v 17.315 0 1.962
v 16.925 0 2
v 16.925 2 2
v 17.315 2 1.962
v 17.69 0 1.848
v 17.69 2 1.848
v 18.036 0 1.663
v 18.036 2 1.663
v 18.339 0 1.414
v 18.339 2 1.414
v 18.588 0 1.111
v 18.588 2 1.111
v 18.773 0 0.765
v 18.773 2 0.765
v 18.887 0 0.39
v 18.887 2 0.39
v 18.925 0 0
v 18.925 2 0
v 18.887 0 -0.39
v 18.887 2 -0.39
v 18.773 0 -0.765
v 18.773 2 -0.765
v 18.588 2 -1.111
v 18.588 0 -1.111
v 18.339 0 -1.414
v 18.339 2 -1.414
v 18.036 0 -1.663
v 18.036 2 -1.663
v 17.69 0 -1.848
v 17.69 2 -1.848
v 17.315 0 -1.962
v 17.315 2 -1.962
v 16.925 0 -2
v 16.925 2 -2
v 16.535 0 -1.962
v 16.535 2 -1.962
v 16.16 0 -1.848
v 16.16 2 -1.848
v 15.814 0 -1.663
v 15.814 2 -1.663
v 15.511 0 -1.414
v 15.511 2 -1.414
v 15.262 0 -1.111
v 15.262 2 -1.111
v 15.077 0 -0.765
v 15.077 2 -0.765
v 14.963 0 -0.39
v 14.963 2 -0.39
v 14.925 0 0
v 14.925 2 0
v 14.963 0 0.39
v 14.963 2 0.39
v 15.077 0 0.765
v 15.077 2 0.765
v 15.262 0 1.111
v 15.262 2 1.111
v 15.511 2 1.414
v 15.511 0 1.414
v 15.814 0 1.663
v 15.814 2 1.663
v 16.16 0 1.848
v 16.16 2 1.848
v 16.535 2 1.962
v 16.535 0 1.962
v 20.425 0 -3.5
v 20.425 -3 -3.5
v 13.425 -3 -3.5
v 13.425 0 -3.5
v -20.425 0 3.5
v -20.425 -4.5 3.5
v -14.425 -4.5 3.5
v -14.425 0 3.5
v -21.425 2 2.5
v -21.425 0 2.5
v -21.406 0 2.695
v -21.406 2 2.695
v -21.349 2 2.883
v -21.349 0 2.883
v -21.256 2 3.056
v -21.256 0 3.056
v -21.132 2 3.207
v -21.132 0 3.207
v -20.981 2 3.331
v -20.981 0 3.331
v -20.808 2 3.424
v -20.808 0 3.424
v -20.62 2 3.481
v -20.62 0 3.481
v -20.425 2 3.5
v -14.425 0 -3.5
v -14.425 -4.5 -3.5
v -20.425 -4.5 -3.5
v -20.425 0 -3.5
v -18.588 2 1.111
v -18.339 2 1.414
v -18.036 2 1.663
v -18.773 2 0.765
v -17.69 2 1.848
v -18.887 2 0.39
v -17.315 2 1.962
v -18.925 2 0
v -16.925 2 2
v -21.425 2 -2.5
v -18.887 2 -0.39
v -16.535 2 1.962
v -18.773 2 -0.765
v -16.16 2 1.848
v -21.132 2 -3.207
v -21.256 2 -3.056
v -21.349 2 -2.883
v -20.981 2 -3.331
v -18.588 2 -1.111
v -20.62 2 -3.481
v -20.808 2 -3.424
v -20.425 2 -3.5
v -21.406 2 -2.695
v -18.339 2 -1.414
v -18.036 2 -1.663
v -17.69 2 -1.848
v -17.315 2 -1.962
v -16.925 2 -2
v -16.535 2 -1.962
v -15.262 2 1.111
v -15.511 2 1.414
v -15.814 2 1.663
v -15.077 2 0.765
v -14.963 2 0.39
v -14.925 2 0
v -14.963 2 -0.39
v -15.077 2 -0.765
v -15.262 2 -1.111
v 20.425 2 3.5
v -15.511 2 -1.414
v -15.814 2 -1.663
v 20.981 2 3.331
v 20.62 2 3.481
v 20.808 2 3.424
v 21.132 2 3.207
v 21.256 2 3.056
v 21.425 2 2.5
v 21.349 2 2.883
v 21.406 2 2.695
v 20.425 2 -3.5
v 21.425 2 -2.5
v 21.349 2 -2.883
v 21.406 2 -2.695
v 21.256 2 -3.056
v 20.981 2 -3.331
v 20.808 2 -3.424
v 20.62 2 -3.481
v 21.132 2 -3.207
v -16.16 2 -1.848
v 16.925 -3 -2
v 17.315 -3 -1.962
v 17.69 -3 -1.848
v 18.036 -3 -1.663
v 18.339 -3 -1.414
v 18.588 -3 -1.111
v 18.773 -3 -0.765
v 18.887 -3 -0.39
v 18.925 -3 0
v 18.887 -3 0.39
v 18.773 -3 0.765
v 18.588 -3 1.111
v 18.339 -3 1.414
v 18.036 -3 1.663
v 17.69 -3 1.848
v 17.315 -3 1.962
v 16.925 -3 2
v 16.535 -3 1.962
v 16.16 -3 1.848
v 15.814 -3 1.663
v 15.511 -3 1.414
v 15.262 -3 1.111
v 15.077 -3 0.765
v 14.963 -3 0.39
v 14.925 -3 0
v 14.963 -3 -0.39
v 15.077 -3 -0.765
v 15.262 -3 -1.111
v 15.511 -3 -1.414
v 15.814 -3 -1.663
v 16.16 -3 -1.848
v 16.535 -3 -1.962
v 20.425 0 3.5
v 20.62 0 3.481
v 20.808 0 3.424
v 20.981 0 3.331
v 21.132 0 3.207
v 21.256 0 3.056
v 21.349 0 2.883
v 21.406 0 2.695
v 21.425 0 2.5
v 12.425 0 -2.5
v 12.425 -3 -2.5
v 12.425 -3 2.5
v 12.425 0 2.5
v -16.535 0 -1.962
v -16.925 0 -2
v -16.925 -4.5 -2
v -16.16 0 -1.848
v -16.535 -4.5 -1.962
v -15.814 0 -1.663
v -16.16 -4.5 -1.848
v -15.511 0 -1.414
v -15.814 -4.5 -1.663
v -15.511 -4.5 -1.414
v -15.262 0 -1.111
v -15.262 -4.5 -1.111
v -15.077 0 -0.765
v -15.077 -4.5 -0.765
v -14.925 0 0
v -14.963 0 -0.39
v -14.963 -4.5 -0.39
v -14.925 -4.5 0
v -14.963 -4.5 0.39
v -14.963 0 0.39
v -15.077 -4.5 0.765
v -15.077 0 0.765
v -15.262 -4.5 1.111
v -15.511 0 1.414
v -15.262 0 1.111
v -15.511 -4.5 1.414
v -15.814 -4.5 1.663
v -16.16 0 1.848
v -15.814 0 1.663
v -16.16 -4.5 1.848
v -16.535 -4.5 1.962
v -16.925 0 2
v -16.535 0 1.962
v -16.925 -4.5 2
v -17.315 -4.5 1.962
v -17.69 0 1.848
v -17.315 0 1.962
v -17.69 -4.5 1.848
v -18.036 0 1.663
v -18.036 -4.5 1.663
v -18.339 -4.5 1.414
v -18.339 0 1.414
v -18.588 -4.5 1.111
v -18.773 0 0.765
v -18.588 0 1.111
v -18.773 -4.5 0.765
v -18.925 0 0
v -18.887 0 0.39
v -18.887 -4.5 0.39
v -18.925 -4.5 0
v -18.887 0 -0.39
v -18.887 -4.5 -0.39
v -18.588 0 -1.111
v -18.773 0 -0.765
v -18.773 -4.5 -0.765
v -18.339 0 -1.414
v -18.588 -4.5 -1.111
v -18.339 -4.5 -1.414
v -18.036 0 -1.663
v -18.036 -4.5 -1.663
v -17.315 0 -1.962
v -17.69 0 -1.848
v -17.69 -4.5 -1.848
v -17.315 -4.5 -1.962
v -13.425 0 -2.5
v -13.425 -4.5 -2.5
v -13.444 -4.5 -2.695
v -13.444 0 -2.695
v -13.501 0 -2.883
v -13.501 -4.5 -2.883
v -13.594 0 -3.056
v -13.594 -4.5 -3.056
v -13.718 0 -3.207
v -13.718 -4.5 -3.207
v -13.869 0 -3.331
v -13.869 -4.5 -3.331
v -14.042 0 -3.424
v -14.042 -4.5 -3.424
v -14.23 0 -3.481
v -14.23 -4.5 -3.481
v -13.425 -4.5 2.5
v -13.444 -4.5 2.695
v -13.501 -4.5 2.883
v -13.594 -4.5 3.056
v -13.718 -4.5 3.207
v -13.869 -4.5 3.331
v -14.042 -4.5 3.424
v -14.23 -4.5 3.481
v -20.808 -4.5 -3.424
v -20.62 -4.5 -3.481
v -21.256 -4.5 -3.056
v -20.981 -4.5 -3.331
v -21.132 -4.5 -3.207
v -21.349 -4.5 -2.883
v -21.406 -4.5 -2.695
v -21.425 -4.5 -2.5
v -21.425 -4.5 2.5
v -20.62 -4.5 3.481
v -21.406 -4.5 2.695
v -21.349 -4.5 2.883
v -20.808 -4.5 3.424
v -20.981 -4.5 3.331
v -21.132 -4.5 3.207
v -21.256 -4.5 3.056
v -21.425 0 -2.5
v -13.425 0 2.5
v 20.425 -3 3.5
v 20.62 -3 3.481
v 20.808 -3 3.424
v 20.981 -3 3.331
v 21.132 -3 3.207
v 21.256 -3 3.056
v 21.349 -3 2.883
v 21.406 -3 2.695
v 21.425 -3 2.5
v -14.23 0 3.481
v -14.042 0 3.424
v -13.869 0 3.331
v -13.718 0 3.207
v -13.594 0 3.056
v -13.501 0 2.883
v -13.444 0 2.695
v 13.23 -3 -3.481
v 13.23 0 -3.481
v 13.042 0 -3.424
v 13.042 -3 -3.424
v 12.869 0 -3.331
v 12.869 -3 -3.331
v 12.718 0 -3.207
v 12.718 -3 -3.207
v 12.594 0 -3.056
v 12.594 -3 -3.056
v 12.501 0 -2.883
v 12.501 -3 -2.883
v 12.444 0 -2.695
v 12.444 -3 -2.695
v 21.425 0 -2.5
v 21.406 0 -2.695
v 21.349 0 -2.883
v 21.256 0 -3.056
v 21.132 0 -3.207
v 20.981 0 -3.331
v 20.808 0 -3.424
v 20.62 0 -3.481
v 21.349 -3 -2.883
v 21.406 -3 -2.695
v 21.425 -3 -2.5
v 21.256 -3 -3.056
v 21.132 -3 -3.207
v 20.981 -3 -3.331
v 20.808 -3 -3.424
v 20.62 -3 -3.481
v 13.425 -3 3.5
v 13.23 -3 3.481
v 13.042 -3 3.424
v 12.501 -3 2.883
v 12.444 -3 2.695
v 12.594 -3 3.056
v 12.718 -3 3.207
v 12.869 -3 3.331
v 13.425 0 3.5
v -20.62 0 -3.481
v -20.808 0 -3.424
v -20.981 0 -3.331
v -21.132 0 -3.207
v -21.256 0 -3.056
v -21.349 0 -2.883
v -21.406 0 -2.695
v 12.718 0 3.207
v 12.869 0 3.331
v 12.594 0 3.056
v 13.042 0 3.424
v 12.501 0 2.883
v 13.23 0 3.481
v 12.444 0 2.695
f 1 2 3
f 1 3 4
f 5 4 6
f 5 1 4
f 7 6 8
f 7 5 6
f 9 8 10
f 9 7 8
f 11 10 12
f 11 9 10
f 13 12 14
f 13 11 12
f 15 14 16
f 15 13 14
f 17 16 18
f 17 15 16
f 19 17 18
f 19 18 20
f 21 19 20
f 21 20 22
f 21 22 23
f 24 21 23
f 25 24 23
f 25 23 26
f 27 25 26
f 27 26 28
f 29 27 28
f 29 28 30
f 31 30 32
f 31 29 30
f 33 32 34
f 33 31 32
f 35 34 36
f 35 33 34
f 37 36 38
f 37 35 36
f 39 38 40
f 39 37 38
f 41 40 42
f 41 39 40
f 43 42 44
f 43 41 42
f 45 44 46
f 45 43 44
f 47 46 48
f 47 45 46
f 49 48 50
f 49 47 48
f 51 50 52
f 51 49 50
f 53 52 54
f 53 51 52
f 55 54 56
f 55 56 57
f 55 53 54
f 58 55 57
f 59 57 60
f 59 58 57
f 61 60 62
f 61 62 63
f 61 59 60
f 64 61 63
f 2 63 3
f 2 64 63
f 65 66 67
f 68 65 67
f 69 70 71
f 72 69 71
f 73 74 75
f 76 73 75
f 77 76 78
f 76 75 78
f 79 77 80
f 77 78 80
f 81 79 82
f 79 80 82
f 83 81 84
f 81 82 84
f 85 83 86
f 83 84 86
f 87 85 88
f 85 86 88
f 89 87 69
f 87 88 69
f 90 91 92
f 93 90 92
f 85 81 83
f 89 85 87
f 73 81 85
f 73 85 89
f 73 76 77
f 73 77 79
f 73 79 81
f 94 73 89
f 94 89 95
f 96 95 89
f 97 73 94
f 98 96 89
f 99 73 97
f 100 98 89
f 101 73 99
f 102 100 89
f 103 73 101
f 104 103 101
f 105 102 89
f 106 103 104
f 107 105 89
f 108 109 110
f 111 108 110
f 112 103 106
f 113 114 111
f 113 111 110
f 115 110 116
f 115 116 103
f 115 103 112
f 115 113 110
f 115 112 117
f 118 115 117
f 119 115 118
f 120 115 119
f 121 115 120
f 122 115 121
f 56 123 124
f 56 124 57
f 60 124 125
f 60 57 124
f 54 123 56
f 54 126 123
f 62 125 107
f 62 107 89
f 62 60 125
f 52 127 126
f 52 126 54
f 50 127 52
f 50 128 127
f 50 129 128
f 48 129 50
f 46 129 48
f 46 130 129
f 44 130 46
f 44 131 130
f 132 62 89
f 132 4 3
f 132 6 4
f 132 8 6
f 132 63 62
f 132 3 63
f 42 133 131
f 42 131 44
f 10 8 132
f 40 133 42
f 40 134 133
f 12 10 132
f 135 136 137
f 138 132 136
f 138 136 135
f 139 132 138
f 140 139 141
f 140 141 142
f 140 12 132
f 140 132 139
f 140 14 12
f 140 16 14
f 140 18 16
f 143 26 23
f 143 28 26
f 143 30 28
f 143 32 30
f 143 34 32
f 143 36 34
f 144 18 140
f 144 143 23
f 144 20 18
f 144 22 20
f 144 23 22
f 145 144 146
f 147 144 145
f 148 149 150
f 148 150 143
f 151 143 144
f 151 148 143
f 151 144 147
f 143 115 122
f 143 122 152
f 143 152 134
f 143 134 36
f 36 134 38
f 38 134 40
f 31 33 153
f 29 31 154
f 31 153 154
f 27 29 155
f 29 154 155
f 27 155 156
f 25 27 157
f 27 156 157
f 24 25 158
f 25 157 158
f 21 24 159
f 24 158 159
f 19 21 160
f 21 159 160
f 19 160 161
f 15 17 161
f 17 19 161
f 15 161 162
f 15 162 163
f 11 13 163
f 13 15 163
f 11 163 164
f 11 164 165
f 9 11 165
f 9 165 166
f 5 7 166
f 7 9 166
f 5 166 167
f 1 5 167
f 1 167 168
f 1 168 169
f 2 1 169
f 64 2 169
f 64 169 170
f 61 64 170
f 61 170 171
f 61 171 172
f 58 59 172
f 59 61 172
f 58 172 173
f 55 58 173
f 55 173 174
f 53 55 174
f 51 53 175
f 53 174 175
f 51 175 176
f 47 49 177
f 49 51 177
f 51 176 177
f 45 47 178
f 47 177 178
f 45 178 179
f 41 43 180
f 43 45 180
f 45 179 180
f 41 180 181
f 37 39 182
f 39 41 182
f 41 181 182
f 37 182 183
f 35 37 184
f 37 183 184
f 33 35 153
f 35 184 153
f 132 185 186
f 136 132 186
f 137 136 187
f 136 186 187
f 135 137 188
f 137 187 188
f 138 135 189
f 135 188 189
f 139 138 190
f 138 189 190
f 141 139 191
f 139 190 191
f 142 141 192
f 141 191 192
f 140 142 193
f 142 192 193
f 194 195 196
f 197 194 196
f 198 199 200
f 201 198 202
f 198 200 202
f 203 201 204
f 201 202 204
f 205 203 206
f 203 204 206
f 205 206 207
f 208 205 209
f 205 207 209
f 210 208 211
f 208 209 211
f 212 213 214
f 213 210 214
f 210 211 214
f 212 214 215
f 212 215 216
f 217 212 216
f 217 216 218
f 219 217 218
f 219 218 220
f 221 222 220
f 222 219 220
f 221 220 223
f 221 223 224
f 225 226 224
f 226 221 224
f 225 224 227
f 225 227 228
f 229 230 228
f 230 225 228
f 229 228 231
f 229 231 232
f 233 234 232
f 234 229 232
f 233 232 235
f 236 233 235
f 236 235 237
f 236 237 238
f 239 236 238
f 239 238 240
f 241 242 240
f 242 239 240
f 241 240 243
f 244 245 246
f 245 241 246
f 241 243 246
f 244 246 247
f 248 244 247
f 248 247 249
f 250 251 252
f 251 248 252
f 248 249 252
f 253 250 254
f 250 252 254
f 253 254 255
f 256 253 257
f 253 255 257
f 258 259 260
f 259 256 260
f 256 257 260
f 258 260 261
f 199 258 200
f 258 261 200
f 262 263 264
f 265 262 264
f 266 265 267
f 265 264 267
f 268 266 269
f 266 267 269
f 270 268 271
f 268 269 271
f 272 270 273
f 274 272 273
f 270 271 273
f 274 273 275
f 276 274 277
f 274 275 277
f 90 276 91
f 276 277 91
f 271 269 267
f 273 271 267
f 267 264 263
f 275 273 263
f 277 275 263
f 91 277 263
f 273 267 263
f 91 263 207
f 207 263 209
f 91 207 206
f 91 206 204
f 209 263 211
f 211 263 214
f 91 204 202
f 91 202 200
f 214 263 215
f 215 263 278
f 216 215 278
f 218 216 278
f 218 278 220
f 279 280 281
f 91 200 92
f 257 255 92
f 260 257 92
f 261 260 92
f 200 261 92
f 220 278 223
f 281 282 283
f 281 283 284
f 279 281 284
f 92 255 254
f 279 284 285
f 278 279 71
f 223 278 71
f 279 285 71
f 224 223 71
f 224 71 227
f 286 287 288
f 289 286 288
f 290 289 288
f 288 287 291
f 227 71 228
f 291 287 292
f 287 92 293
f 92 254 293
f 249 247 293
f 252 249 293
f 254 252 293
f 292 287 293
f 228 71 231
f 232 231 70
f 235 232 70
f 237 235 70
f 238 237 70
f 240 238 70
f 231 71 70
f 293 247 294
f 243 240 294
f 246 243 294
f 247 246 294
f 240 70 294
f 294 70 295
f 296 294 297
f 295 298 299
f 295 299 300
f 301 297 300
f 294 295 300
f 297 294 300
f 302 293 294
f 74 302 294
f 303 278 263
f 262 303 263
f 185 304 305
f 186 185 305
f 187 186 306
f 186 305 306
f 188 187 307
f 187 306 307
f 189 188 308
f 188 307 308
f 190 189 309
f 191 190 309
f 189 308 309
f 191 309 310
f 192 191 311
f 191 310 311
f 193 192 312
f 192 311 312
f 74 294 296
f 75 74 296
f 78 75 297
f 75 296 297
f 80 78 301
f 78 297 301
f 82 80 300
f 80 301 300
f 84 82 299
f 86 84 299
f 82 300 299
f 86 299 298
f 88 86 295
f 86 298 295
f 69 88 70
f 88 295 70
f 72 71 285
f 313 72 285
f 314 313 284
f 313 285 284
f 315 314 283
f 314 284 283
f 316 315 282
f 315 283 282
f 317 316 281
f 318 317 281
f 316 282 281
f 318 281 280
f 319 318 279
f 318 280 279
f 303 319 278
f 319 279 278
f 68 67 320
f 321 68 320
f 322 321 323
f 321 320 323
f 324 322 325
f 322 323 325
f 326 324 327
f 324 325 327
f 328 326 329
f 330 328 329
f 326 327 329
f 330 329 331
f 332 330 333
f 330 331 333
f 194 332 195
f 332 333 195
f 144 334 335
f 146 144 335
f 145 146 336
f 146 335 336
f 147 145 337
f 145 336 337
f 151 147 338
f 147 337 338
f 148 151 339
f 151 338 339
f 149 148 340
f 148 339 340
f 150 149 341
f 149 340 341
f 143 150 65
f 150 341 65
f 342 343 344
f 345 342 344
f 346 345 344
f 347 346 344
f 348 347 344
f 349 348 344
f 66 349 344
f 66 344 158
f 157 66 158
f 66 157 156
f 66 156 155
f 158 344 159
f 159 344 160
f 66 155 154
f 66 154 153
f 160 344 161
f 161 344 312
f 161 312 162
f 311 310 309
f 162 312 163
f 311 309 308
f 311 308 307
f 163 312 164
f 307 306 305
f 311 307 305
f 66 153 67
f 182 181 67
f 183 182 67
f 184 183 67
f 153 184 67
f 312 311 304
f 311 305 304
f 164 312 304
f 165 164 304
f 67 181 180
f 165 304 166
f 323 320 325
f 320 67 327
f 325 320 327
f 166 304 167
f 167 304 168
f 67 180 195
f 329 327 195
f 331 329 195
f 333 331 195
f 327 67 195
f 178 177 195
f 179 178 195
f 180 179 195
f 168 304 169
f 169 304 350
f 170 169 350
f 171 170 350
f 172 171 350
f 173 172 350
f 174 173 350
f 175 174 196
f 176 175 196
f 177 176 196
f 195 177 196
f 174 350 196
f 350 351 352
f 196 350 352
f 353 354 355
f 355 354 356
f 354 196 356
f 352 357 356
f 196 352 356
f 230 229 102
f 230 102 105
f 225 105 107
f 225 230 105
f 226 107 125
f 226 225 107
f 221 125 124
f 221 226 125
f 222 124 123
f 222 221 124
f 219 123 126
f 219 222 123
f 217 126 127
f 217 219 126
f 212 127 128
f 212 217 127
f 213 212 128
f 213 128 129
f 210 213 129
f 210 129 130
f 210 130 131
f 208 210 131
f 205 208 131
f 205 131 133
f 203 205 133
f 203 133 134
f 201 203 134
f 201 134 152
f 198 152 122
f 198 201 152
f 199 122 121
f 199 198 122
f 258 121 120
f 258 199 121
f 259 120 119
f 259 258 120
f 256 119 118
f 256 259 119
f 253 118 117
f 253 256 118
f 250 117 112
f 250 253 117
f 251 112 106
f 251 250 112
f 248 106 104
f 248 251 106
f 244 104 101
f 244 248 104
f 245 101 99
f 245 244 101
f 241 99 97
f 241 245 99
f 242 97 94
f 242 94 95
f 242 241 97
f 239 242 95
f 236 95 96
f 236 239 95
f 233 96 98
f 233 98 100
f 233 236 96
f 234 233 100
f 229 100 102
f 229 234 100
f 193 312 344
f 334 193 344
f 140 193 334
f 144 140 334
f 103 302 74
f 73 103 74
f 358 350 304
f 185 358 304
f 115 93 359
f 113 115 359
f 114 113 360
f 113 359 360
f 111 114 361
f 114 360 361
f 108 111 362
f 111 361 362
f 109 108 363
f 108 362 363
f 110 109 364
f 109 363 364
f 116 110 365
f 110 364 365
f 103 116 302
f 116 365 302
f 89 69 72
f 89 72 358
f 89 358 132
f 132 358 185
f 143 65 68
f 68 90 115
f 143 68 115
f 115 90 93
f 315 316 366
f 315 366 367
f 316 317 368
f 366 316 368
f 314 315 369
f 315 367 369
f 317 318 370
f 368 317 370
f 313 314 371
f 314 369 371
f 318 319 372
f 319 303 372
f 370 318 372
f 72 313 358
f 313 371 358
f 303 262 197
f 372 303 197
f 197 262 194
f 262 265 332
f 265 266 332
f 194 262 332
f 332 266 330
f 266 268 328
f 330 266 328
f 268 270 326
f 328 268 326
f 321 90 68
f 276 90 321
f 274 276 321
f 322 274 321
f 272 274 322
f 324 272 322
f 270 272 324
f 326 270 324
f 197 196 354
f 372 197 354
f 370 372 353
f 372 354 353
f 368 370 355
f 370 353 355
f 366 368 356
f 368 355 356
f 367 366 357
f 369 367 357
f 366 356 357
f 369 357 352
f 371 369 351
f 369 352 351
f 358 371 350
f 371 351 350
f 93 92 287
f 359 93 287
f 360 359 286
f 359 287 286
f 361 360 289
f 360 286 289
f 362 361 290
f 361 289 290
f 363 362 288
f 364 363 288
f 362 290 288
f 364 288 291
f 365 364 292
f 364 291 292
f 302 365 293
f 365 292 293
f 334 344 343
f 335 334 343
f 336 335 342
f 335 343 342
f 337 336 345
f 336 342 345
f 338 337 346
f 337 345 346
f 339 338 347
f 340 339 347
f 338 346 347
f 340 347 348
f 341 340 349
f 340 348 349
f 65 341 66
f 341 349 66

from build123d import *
from build123d.topology import SkipClean

# Parameters (mm, degrees)
SKETCH1_R           = 2
BOSS_EXTRUDE1_DEPTH = 2
BOSS_EXTRUDE2_START = 4.5
SKETCH2_R           = 2
BOSS_EXTRUDE2_DEPTH = 4.5
BOSS_EXTRUDE3_START = 3
SKETCH3_R           = 2
BOSS_EXTRUDE3_DEPTH = 3


with BuildPart() as part:
    # Sketch1 → Boss-Extrude1 (new body)
    with BuildSketch(Plane(origin=(0, 0, 0), x_dir=(1, 0, 0), z_dir=(0, 1, 0))):
        with BuildLine():
            Line((-20.425, -3.5), (20.425, -3.5))
            ThreePointArc((20.425, -3.5), (21.132106781, -3.207106781), (21.425, -2.5))
            Line((21.425, -2.5), (21.425, 2.5))
            ThreePointArc((21.425, 2.5), (21.132106781, 3.207106781), (20.425, 3.5))
            Line((20.425, 3.5), (-20.425, 3.5))
            ThreePointArc((-20.425, 3.5), (-21.132106781, 3.207106781), (-21.425, 2.5))
            Line((-21.425, 2.5), (-21.425, -2.5))
            ThreePointArc((-21.425, -2.5), (-21.132106781, -3.207106781), (-20.425, -3.5))
        make_face()
        with Locations(Location((-16.925, 0, 0), (0, 0, 270))):
            Circle(SKETCH1_R, mode=Mode.SUBTRACT)
        with Locations(Location((16.925, 0, 0), (0, 0, 270))):
            Circle(SKETCH1_R, mode=Mode.SUBTRACT)
    extrude(amount=BOSS_EXTRUDE1_DEPTH)

    # Sketch2 → Boss-Extrude2 (add)
    with SkipClean():  # the faces are left unmerged after this step: merging them gives an invalid solid
        with BuildSketch(Plane.XZ.offset(BOSS_EXTRUDE2_START)):
            with BuildLine():
                Line((-14.425, -3.5), (-20.425, -3.5))
                ThreePointArc((-20.425, -3.5), (-21.132106781, -3.207106781), (-21.425, -2.5))
                Line((-21.425, -2.5), (-21.425, 2.5))
                ThreePointArc((-21.425, 2.5), (-21.132106781, 3.207106781), (-20.425, 3.5))
                Line((-20.425, 3.5), (-14.425, 3.5))
                ThreePointArc((-14.425, 3.5), (-13.717893219, 3.207106781), (-13.425, 2.5))
                Line((-13.425, 2.5), (-13.425, -2.5))
                ThreePointArc((-13.425, -2.5), (-13.717893219, -3.207106781), (-14.425, -3.5))
            make_face()
            with Locations(Location((-16.925, 0, 0), (0, 0, 270))):
                Circle(SKETCH2_R, mode=Mode.SUBTRACT)
        extrude(amount=-BOSS_EXTRUDE2_DEPTH)

    # Sketch3 → Boss-Extrude3 (add)
    with SkipClean():  # the faces are left unmerged after this step: merging them gives an invalid solid
        with BuildSketch(Plane.XZ.offset(BOSS_EXTRUDE3_START)):
            with BuildLine():
                Line((13.425, 3.5), (20.425, 3.5))
                ThreePointArc((20.425, 3.5), (21.132106781, 3.207106781), (21.425, 2.5))
                Line((21.425, 2.5), (21.425, -2.5))
                ThreePointArc((21.425, -2.5), (21.132106781, -3.207106781), (20.425, -3.5))
                Line((20.425, -3.5), (13.425, -3.5))
                ThreePointArc((13.425, -3.5), (12.717893219, -3.207106781), (12.425, -2.5))
                Line((12.425, -2.5), (12.425, 2.5))
                ThreePointArc((12.425, 2.5), (12.717893219, 3.207106781), (13.425, 3.5))
            make_face()
            with Locations(Location((16.925, 0, 0), (0, 0, 270))):
                Circle(SKETCH3_R, mode=Mode.SUBTRACT)
        extrude(amount=-BOSS_EXTRUDE3_DEPTH)


solid = part.part
